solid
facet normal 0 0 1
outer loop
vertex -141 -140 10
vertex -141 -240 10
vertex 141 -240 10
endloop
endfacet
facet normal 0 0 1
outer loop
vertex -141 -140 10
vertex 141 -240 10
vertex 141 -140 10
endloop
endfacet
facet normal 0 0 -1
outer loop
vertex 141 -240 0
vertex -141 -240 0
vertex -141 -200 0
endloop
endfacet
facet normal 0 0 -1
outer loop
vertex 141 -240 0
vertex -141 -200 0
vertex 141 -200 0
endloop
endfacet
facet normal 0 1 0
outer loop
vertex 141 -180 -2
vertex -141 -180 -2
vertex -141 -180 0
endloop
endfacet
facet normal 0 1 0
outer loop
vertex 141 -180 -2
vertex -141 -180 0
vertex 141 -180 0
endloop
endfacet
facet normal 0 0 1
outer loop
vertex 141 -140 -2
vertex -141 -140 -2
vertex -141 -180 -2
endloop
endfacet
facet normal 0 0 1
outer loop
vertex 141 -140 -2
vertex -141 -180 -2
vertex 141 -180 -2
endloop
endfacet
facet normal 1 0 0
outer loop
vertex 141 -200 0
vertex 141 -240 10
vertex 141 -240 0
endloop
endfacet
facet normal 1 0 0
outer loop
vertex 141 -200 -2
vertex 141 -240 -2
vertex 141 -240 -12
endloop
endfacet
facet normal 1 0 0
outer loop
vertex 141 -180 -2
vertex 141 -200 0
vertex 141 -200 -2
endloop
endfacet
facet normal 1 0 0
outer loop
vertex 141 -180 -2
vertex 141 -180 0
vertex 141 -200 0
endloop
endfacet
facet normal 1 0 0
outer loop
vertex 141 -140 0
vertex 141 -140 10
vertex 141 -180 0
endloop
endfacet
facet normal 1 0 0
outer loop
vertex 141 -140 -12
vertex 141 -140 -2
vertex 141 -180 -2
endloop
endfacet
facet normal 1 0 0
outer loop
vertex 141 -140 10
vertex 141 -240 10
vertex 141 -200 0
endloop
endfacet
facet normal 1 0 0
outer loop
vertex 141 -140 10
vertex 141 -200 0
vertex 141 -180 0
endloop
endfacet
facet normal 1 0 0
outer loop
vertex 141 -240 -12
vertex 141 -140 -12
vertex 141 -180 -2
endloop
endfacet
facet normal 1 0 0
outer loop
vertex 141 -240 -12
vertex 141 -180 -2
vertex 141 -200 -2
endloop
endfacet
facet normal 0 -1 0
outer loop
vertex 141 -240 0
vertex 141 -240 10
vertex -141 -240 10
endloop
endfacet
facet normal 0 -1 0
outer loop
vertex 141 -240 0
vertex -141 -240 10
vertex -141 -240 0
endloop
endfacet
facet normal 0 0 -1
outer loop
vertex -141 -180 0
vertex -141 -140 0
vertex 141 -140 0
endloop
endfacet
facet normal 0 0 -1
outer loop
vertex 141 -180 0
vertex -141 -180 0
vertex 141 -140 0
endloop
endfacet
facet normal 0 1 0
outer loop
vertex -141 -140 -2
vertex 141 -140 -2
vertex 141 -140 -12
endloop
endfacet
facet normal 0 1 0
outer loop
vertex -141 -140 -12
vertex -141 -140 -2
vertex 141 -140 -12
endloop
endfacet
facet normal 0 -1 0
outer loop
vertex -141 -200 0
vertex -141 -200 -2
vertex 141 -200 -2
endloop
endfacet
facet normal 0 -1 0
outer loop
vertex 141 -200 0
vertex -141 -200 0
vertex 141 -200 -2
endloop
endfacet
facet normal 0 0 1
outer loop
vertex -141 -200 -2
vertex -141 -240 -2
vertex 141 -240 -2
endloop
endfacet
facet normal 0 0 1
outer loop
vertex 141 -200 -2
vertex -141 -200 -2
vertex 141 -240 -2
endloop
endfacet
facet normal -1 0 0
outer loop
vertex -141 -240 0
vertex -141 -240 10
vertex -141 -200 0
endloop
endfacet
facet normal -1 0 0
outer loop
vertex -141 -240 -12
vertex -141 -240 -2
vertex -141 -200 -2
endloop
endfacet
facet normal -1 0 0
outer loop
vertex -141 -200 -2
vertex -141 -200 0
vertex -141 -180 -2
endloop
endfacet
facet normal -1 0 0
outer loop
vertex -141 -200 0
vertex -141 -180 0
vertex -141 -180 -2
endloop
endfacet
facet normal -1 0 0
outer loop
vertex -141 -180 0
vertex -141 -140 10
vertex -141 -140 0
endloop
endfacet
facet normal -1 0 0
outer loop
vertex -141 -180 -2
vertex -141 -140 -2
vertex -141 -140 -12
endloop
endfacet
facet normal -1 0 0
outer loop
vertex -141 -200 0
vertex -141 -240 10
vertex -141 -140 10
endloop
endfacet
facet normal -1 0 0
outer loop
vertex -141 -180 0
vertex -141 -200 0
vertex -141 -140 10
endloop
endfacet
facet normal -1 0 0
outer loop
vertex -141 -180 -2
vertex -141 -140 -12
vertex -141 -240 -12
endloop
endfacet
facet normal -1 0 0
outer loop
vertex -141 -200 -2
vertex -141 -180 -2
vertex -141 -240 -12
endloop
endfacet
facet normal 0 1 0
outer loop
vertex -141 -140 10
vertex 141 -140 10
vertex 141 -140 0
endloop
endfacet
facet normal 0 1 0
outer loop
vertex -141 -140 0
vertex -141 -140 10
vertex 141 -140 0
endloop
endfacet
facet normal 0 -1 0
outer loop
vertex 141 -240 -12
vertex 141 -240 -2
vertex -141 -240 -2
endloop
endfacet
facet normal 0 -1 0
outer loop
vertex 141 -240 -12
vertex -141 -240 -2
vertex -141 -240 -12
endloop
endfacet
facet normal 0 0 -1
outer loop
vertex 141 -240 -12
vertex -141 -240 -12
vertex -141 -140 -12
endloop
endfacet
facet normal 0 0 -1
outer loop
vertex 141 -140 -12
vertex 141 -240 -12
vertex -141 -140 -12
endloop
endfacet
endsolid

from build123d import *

# Parameters (mm, degrees)
BOSS_EXTRUDE1_DEPTH      = 141
BOSS_EXTRUDE1_DEPTH_BACK = 141
SKETCH1_W                = 22
SKETCH1_H                = 100
CAVITY1_START            = -2
CAVITY1_OUTLINE_W        = 282
CAVITY1_OUTLINE_H        = 40
CAVITY1_DEPTH            = 2


# Read off the part's stored shape, not the designer's step: Cavity1
with BuildPart() as part:
    # Sketch1 → Boss-Extrude1 (new, two sides: drawn at the far end of the back side and taken through both)
    with BuildSketch(Plane(origin=(0, 0, 0), x_dir=(0, 0, -1), z_dir=(1, 0, 0)).offset(-BOSS_EXTRUDE1_DEPTH_BACK)):
        with Locations((1, -190)):
            Rectangle(SKETCH1_W, SKETCH1_H)
    extrude(amount=BOSS_EXTRUDE1_DEPTH + BOSS_EXTRUDE1_DEPTH_BACK)

    # Cavity1 outline → Cavity1 (cut)
    with BuildSketch(Plane.XY.offset(CAVITY1_START)):
        with Locations((0, -160)):
            Rectangle(CAVITY1_OUTLINE_W, CAVITY1_OUTLINE_H)
    cavity1 = extrude(amount=CAVITY1_DEPTH, mode=Mode.SUBTRACT)

    # Mirror1: Cavity1 across plane
    add(cavity1.mirror(Plane.ZX.offset(-190)), mode=Mode.SUBTRACT)


solid = part.part
